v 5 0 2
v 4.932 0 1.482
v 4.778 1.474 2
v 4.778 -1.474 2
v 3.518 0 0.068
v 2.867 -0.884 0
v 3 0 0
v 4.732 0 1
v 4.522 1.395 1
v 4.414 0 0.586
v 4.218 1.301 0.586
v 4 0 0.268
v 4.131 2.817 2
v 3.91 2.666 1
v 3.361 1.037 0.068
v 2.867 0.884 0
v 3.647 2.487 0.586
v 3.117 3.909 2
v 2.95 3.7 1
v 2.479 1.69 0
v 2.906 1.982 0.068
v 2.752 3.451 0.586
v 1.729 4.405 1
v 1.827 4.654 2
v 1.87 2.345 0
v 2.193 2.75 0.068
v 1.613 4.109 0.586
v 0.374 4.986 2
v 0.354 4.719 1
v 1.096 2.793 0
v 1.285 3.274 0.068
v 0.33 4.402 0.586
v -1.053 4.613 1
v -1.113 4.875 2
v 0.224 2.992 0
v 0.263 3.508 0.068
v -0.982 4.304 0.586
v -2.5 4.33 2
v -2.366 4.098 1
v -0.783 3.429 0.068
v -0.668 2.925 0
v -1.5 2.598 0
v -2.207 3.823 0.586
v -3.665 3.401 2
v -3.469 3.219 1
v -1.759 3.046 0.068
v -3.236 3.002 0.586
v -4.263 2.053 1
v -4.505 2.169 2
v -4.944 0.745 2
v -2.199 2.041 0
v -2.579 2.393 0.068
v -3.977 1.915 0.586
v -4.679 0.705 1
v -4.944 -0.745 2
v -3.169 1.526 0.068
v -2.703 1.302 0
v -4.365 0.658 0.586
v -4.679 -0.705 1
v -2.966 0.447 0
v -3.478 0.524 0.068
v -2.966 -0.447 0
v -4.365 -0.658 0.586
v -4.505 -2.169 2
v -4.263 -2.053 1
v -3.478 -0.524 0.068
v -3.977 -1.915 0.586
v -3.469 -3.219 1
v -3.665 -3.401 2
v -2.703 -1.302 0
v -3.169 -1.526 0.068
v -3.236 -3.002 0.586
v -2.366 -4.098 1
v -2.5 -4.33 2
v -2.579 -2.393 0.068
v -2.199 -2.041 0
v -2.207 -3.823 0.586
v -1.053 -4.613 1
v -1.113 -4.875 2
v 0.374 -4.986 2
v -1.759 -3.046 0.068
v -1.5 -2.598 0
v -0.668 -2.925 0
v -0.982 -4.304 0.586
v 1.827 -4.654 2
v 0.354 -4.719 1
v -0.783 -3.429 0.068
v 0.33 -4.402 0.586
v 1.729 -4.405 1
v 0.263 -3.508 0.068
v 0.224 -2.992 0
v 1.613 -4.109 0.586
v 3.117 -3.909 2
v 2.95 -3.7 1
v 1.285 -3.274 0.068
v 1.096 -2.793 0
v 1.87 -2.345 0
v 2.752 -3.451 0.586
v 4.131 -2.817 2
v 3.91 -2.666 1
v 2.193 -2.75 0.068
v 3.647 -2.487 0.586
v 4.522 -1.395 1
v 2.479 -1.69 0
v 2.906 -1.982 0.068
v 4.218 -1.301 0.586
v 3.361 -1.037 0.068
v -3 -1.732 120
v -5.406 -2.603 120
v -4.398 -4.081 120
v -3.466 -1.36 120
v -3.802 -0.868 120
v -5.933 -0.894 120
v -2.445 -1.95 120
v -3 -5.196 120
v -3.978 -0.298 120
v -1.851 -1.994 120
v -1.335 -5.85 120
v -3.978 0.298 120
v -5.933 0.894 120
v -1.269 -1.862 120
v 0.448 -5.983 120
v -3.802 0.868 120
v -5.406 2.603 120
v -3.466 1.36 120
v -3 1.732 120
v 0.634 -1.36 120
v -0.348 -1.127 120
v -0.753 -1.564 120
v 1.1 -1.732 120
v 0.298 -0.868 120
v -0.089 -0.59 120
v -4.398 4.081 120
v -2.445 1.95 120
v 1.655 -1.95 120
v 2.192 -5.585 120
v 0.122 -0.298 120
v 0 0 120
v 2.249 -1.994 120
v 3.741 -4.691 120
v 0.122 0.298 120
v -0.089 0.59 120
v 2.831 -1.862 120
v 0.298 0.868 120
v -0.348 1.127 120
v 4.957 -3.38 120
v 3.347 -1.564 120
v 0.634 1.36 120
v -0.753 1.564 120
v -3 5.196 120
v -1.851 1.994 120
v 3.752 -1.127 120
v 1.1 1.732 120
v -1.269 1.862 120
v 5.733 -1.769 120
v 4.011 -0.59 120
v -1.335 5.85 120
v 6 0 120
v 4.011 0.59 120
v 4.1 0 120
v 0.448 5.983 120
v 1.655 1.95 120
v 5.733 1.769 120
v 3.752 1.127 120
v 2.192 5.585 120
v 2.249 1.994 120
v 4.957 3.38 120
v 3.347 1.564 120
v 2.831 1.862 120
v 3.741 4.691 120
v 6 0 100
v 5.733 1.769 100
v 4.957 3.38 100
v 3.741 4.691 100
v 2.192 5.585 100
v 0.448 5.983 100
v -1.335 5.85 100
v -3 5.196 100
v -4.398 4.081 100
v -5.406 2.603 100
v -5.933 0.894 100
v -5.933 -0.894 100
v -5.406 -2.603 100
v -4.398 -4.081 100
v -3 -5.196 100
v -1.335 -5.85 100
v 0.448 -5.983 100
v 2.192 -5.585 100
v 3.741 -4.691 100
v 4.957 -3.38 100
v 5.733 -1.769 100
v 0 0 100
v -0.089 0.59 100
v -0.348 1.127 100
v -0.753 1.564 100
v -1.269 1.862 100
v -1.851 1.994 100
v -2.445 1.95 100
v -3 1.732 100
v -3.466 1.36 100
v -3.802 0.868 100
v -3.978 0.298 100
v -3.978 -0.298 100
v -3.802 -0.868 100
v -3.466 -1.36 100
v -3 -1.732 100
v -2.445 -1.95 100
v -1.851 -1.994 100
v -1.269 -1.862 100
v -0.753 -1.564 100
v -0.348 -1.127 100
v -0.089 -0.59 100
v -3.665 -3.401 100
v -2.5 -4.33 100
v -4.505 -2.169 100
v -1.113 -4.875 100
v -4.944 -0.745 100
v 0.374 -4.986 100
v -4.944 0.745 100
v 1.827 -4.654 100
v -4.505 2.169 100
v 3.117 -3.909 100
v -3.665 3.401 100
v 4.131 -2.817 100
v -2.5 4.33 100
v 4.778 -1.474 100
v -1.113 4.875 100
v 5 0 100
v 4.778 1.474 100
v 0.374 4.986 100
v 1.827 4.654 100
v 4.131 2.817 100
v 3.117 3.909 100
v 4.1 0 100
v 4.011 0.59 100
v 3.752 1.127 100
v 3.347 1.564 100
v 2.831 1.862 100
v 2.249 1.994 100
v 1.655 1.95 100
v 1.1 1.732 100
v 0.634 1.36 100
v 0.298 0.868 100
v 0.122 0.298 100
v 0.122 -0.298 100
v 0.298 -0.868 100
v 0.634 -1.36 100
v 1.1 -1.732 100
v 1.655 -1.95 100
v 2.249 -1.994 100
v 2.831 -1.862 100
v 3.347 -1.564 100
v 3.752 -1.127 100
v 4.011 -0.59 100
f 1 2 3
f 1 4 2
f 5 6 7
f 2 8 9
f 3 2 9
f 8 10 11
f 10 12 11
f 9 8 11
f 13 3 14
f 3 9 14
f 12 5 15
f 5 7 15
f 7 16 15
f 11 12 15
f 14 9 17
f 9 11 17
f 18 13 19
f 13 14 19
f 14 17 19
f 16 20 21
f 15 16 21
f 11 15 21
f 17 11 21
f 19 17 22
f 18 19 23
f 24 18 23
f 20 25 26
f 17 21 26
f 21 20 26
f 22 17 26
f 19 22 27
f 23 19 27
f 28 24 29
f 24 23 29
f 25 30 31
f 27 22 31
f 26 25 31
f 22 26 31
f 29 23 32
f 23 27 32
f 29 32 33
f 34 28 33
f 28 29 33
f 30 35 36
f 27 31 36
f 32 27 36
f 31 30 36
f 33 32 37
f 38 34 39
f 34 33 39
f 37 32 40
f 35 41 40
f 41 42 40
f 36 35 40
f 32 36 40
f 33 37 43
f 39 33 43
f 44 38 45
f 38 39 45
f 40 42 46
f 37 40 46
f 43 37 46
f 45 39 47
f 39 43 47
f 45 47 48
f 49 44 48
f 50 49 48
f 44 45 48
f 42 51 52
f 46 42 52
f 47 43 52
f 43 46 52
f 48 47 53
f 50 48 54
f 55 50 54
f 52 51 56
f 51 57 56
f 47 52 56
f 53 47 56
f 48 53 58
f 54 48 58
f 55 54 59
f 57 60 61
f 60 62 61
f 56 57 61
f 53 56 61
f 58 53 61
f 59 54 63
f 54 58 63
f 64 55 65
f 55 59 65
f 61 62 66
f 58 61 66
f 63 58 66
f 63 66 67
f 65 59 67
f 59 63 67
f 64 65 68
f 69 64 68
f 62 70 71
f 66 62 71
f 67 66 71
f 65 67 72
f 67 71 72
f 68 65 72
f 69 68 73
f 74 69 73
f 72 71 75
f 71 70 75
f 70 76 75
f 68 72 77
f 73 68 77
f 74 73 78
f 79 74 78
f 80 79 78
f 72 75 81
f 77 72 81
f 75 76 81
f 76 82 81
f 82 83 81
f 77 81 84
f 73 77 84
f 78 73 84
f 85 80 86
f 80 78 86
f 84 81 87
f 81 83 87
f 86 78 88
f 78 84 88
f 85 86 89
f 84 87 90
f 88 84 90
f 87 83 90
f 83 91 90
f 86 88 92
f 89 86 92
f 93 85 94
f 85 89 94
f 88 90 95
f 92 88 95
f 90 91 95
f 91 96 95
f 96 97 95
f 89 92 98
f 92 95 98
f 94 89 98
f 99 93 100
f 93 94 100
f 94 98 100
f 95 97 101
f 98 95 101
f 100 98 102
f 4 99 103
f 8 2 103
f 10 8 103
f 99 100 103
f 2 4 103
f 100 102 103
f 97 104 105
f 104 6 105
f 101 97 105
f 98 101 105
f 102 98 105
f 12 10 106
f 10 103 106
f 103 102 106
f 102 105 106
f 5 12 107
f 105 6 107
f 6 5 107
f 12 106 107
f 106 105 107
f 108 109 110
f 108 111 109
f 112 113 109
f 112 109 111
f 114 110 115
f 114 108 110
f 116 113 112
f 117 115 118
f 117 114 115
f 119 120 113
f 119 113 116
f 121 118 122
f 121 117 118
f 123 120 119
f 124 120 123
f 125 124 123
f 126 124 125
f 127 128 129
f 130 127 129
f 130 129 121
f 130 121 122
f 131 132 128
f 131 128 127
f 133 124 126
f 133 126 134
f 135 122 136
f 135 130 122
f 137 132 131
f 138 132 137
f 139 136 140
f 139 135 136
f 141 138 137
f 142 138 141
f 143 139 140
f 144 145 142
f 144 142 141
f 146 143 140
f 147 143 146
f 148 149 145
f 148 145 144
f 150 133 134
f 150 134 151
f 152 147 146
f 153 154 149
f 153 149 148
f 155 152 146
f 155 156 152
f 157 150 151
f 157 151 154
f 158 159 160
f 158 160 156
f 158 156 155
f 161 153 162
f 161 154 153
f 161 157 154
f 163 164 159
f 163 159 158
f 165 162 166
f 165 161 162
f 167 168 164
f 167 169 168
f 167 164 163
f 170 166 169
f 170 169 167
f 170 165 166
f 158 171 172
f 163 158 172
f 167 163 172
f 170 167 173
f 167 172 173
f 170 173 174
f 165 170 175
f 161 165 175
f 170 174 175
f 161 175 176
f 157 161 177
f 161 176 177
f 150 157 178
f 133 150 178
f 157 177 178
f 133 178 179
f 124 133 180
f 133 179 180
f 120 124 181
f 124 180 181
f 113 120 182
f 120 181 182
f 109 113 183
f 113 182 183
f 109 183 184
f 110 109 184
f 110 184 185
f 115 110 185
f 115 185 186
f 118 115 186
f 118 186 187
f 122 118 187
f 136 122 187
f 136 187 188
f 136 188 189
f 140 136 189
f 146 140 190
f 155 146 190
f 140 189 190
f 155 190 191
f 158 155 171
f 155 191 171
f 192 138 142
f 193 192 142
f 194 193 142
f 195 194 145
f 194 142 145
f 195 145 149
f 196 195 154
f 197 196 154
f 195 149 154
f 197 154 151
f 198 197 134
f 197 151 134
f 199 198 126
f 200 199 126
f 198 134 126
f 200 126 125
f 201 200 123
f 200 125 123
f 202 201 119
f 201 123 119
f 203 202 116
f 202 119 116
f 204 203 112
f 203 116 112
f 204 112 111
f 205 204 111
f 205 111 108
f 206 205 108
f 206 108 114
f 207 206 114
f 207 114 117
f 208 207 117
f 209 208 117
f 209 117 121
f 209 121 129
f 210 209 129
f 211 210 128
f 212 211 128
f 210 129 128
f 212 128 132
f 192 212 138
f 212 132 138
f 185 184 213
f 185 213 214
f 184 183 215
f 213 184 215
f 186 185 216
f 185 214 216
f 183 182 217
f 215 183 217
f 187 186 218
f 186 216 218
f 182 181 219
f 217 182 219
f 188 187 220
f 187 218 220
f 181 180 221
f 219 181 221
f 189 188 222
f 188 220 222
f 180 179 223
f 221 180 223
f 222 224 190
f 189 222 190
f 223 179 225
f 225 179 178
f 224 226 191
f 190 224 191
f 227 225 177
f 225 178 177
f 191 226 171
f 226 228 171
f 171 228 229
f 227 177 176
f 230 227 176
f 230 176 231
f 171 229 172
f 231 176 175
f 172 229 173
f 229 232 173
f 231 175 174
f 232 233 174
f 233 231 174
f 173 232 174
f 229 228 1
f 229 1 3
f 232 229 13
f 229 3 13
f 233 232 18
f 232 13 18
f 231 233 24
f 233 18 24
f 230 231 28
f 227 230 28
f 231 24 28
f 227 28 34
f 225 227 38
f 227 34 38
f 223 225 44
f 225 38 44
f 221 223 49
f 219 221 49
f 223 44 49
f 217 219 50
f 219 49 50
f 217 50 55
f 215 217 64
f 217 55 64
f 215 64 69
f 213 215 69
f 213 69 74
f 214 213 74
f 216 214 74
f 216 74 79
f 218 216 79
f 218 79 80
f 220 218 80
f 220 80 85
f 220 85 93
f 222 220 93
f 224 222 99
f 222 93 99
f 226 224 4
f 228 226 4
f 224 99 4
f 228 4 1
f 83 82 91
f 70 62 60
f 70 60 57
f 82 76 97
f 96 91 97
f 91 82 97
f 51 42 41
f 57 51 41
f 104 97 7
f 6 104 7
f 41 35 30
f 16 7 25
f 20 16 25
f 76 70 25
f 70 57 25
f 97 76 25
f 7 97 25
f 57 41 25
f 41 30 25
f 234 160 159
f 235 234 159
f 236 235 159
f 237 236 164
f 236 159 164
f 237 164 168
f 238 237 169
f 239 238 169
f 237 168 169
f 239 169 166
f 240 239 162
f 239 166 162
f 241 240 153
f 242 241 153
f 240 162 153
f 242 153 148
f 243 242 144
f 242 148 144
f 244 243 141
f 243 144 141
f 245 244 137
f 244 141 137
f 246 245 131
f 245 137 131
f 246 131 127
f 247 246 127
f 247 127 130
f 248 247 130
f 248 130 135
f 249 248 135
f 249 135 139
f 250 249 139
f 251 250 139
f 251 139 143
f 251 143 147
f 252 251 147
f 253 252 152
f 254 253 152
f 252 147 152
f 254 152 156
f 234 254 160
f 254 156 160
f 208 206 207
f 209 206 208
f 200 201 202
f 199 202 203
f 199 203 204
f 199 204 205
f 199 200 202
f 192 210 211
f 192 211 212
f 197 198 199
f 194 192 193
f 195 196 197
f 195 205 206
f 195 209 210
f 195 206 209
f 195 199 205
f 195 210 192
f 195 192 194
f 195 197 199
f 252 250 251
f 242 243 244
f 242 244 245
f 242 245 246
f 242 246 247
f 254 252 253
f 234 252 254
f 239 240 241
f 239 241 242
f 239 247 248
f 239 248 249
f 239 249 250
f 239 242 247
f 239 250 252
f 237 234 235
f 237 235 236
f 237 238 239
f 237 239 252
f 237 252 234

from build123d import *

# Parameters (mm, degrees)
SKETCH1_R           = 5
BOSS_EXTRUDE1_DEPTH = 100
FILLET3_R           = 2
SKETCH2_R           = 6
BOSS_EXTRUDE2_DEPTH = 20
SKETCH3_R           = 2
CUT_EXTRUDE2_DEPTH  = 20


with BuildPart() as part:
    # Sketch1 → Boss-Extrude1 (new body)
    with BuildSketch(Plane.XY):
        Circle(SKETCH1_R)
    extrude(amount=BOSS_EXTRUDE1_DEPTH)

    # Fillet3
    fillet3_edges = [part.edges().sort_by_distance(p)[0] for p in [
        (-5, 0, 0),
    ]]
    fillet(fillet3_edges, radius=FILLET3_R)

    # Sketch2 → Boss-Extrude2 (add)
    with BuildSketch(Plane.XY.offset(100)):
        Circle(SKETCH2_R)
    extrude(amount=BOSS_EXTRUDE2_DEPTH)

    # Sketch3 → Cut-Extrude2 (cut)
    with BuildSketch(Plane.XY.offset(120)):
        with Locations((-2, 0)):
            Circle(SKETCH3_R)
        with Locations((2.1, 0)):
            Circle(SKETCH3_R)
    extrude(amount=-CUT_EXTRUDE2_DEPTH, mode=Mode.SUBTRACT)


solid = part.part
